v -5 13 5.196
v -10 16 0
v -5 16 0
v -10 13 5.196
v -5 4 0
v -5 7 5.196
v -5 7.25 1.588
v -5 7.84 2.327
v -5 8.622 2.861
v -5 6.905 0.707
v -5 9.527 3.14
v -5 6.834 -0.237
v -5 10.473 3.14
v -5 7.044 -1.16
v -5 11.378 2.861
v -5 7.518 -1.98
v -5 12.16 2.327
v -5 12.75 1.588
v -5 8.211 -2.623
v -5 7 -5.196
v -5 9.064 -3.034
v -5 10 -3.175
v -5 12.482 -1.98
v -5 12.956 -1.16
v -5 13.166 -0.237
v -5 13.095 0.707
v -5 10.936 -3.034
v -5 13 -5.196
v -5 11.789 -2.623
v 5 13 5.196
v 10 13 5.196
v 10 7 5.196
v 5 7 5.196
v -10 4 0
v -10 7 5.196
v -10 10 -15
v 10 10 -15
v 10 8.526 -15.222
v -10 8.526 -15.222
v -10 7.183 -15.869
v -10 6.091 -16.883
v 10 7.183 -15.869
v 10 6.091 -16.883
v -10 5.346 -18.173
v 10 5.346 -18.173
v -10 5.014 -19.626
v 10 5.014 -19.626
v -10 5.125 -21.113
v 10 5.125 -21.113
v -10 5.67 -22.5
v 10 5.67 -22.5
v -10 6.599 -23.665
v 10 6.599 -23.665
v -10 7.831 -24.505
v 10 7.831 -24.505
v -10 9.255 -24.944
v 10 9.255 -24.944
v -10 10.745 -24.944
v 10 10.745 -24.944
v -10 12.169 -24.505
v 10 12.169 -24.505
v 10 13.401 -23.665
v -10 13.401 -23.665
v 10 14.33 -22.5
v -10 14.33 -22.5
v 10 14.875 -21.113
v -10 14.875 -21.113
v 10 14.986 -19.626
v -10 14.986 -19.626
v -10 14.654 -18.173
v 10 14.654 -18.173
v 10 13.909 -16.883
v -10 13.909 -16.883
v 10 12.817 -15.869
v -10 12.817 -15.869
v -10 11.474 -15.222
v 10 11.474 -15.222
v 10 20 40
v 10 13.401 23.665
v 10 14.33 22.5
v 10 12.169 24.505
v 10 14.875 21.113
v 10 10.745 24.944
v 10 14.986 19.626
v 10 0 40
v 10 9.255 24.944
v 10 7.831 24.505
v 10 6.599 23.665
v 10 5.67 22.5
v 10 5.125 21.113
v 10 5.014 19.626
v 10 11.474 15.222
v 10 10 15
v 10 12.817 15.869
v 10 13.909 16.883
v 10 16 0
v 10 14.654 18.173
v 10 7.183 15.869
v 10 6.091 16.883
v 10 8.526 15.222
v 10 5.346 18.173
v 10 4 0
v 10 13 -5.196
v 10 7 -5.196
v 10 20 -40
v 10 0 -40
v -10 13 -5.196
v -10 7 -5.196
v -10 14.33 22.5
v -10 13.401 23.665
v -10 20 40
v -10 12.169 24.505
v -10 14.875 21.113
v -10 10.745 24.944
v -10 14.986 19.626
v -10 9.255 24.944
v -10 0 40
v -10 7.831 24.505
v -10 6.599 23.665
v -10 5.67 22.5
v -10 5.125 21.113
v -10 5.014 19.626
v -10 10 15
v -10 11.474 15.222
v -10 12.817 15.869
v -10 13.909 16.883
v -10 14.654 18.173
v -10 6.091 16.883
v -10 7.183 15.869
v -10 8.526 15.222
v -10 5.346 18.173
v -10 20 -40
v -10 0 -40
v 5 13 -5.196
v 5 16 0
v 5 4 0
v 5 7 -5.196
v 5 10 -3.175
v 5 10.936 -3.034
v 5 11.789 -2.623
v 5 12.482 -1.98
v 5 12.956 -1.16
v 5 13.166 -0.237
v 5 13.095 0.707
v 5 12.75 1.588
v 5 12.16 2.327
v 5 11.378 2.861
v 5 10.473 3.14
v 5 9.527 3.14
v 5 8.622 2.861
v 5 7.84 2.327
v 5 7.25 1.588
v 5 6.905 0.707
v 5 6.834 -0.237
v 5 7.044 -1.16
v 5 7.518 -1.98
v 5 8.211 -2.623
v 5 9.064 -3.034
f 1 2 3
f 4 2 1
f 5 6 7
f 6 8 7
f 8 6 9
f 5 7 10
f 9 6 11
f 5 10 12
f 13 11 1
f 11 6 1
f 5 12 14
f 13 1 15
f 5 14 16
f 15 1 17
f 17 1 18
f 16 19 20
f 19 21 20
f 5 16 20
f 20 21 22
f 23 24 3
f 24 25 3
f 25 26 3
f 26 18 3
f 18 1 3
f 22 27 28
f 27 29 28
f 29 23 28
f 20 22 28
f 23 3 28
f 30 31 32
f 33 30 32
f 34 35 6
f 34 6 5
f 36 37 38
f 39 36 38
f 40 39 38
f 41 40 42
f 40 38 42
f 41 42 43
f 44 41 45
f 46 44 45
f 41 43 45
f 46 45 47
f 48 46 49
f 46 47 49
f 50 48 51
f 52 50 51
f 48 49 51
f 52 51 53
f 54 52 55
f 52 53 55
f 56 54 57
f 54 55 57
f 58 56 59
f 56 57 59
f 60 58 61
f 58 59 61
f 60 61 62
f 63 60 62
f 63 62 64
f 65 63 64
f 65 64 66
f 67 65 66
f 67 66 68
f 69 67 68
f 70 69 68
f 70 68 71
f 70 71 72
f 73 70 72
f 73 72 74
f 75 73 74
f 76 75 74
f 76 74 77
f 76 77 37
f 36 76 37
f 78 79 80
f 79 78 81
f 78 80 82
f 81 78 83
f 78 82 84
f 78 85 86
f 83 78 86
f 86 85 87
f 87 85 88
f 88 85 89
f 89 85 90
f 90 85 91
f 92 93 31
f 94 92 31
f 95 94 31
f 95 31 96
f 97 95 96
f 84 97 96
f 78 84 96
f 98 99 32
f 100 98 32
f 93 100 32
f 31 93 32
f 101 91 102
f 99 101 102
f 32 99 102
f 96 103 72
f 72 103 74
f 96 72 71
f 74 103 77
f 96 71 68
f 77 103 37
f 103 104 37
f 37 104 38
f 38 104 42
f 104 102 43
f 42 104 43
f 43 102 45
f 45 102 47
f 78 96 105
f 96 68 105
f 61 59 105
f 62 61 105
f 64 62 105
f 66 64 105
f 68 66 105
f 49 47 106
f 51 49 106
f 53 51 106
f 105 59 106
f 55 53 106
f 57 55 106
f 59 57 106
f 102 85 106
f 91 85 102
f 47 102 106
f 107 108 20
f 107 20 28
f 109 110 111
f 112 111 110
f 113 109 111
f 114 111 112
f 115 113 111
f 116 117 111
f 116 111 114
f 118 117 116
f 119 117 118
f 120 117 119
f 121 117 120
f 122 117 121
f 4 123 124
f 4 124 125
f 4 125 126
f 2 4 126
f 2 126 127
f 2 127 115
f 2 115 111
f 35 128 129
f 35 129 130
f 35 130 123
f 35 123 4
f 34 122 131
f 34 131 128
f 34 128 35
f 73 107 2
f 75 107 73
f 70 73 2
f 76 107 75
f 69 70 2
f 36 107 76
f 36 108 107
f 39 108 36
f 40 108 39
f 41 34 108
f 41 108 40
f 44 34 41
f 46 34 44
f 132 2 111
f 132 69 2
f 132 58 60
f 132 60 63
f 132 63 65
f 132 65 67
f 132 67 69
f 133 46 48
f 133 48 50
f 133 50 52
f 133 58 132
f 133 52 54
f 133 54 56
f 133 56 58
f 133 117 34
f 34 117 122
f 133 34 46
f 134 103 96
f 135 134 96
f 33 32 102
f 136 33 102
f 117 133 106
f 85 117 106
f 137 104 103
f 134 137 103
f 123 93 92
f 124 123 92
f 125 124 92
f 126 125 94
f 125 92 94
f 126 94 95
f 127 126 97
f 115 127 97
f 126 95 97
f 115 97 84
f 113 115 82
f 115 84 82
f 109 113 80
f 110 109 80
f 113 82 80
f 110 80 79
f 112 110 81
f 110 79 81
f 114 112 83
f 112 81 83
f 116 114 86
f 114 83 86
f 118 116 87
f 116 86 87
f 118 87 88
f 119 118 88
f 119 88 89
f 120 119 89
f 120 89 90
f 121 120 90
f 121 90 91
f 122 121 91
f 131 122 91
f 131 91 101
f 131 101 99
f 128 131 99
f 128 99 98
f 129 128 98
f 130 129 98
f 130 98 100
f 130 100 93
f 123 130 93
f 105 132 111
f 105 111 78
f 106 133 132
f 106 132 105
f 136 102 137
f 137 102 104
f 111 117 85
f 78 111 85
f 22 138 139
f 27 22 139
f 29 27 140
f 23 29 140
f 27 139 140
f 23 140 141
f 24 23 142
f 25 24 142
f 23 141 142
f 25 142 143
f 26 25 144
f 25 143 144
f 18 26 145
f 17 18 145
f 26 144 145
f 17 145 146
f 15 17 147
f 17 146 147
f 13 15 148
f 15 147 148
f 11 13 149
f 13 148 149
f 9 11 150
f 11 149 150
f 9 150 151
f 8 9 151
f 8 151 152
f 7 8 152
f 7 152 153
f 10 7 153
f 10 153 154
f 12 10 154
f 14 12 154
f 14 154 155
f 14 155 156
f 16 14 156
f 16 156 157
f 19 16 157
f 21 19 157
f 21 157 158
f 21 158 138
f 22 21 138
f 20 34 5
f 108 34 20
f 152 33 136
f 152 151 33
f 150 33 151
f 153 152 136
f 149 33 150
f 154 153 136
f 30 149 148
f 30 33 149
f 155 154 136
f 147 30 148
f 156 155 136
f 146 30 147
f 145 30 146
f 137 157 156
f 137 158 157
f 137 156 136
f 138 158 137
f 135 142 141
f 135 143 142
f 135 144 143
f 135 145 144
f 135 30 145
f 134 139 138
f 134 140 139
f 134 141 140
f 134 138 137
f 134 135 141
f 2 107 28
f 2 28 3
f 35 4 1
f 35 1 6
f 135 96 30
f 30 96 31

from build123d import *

# Parameters (mm, degrees)
SKETCH1_W           = 20
SKETCH1_H           = 80
BOSS_EXTRUDE1_DEPTH = 20
SKETCH2_R           = 5
CUT_EXTRUDE1_DEPTH  = 49.989794856
SKETCH5_R           = 3.175
CUT_EXTRUDE4_DEPTH  = 49.989794856
CUT_EXTRUDE3_DEPTH  = 5


with BuildPart() as part:
    # Sketch1 → Boss-Extrude1 (new body)
    with BuildSketch(Plane(origin=(0, 0, 0), x_dir=(1, 0, 0), z_dir=(0, 1, 0))):
        Rectangle(SKETCH1_W, SKETCH1_H)
    extrude(amount=BOSS_EXTRUDE1_DEPTH)

    # Sketch2 → Cut-Extrude1 (cut, through all)
    with BuildSketch(Plane(origin=(10, 0, 0), x_dir=(0, 0, -1), z_dir=(1, 0, 0))):
        with Locations((-20, 10)):
            Circle(SKETCH2_R)
        with Locations(Location((20, 10, 0), (0, 0, 180))):
            Circle(SKETCH2_R)
    extrude(amount=-CUT_EXTRUDE1_DEPTH, mode=Mode.SUBTRACT)

    # Sketch5 → Cut-Extrude4 (cut, through all)
    with BuildSketch(Plane(origin=(10, 0, 0), x_dir=(0, 0, -1), z_dir=(1, 0, 0))):
        with Locations((0, 10)):
            Circle(SKETCH5_R)
    extrude(amount=-CUT_EXTRUDE4_DEPTH, mode=Mode.SUBTRACT)

    # Sketch3 → Cut-Extrude3 (cut)
    with BuildSketch(Plane(origin=(10, 0, 0), x_dir=(0, 0, -1), z_dir=(1, 0, 0))):
        Polygon((0, 16), (-5.196152423, 13), (-5.196152423, 7), (0, 4), (5.196152423, 7), (5.196152423, 13), align=None)
    cut_extrude3 = extrude(amount=-CUT_EXTRUDE3_DEPTH, mode=Mode.SUBTRACT)

    # Mirror1: Cut-Extrude3 across plane
    add(cut_extrude3.mirror(Plane(origin=(0, 0, 0), x_dir=(0, 0, 1), z_dir=(1, 0, 0))), mode=Mode.SUBTRACT)


solid = part.part
